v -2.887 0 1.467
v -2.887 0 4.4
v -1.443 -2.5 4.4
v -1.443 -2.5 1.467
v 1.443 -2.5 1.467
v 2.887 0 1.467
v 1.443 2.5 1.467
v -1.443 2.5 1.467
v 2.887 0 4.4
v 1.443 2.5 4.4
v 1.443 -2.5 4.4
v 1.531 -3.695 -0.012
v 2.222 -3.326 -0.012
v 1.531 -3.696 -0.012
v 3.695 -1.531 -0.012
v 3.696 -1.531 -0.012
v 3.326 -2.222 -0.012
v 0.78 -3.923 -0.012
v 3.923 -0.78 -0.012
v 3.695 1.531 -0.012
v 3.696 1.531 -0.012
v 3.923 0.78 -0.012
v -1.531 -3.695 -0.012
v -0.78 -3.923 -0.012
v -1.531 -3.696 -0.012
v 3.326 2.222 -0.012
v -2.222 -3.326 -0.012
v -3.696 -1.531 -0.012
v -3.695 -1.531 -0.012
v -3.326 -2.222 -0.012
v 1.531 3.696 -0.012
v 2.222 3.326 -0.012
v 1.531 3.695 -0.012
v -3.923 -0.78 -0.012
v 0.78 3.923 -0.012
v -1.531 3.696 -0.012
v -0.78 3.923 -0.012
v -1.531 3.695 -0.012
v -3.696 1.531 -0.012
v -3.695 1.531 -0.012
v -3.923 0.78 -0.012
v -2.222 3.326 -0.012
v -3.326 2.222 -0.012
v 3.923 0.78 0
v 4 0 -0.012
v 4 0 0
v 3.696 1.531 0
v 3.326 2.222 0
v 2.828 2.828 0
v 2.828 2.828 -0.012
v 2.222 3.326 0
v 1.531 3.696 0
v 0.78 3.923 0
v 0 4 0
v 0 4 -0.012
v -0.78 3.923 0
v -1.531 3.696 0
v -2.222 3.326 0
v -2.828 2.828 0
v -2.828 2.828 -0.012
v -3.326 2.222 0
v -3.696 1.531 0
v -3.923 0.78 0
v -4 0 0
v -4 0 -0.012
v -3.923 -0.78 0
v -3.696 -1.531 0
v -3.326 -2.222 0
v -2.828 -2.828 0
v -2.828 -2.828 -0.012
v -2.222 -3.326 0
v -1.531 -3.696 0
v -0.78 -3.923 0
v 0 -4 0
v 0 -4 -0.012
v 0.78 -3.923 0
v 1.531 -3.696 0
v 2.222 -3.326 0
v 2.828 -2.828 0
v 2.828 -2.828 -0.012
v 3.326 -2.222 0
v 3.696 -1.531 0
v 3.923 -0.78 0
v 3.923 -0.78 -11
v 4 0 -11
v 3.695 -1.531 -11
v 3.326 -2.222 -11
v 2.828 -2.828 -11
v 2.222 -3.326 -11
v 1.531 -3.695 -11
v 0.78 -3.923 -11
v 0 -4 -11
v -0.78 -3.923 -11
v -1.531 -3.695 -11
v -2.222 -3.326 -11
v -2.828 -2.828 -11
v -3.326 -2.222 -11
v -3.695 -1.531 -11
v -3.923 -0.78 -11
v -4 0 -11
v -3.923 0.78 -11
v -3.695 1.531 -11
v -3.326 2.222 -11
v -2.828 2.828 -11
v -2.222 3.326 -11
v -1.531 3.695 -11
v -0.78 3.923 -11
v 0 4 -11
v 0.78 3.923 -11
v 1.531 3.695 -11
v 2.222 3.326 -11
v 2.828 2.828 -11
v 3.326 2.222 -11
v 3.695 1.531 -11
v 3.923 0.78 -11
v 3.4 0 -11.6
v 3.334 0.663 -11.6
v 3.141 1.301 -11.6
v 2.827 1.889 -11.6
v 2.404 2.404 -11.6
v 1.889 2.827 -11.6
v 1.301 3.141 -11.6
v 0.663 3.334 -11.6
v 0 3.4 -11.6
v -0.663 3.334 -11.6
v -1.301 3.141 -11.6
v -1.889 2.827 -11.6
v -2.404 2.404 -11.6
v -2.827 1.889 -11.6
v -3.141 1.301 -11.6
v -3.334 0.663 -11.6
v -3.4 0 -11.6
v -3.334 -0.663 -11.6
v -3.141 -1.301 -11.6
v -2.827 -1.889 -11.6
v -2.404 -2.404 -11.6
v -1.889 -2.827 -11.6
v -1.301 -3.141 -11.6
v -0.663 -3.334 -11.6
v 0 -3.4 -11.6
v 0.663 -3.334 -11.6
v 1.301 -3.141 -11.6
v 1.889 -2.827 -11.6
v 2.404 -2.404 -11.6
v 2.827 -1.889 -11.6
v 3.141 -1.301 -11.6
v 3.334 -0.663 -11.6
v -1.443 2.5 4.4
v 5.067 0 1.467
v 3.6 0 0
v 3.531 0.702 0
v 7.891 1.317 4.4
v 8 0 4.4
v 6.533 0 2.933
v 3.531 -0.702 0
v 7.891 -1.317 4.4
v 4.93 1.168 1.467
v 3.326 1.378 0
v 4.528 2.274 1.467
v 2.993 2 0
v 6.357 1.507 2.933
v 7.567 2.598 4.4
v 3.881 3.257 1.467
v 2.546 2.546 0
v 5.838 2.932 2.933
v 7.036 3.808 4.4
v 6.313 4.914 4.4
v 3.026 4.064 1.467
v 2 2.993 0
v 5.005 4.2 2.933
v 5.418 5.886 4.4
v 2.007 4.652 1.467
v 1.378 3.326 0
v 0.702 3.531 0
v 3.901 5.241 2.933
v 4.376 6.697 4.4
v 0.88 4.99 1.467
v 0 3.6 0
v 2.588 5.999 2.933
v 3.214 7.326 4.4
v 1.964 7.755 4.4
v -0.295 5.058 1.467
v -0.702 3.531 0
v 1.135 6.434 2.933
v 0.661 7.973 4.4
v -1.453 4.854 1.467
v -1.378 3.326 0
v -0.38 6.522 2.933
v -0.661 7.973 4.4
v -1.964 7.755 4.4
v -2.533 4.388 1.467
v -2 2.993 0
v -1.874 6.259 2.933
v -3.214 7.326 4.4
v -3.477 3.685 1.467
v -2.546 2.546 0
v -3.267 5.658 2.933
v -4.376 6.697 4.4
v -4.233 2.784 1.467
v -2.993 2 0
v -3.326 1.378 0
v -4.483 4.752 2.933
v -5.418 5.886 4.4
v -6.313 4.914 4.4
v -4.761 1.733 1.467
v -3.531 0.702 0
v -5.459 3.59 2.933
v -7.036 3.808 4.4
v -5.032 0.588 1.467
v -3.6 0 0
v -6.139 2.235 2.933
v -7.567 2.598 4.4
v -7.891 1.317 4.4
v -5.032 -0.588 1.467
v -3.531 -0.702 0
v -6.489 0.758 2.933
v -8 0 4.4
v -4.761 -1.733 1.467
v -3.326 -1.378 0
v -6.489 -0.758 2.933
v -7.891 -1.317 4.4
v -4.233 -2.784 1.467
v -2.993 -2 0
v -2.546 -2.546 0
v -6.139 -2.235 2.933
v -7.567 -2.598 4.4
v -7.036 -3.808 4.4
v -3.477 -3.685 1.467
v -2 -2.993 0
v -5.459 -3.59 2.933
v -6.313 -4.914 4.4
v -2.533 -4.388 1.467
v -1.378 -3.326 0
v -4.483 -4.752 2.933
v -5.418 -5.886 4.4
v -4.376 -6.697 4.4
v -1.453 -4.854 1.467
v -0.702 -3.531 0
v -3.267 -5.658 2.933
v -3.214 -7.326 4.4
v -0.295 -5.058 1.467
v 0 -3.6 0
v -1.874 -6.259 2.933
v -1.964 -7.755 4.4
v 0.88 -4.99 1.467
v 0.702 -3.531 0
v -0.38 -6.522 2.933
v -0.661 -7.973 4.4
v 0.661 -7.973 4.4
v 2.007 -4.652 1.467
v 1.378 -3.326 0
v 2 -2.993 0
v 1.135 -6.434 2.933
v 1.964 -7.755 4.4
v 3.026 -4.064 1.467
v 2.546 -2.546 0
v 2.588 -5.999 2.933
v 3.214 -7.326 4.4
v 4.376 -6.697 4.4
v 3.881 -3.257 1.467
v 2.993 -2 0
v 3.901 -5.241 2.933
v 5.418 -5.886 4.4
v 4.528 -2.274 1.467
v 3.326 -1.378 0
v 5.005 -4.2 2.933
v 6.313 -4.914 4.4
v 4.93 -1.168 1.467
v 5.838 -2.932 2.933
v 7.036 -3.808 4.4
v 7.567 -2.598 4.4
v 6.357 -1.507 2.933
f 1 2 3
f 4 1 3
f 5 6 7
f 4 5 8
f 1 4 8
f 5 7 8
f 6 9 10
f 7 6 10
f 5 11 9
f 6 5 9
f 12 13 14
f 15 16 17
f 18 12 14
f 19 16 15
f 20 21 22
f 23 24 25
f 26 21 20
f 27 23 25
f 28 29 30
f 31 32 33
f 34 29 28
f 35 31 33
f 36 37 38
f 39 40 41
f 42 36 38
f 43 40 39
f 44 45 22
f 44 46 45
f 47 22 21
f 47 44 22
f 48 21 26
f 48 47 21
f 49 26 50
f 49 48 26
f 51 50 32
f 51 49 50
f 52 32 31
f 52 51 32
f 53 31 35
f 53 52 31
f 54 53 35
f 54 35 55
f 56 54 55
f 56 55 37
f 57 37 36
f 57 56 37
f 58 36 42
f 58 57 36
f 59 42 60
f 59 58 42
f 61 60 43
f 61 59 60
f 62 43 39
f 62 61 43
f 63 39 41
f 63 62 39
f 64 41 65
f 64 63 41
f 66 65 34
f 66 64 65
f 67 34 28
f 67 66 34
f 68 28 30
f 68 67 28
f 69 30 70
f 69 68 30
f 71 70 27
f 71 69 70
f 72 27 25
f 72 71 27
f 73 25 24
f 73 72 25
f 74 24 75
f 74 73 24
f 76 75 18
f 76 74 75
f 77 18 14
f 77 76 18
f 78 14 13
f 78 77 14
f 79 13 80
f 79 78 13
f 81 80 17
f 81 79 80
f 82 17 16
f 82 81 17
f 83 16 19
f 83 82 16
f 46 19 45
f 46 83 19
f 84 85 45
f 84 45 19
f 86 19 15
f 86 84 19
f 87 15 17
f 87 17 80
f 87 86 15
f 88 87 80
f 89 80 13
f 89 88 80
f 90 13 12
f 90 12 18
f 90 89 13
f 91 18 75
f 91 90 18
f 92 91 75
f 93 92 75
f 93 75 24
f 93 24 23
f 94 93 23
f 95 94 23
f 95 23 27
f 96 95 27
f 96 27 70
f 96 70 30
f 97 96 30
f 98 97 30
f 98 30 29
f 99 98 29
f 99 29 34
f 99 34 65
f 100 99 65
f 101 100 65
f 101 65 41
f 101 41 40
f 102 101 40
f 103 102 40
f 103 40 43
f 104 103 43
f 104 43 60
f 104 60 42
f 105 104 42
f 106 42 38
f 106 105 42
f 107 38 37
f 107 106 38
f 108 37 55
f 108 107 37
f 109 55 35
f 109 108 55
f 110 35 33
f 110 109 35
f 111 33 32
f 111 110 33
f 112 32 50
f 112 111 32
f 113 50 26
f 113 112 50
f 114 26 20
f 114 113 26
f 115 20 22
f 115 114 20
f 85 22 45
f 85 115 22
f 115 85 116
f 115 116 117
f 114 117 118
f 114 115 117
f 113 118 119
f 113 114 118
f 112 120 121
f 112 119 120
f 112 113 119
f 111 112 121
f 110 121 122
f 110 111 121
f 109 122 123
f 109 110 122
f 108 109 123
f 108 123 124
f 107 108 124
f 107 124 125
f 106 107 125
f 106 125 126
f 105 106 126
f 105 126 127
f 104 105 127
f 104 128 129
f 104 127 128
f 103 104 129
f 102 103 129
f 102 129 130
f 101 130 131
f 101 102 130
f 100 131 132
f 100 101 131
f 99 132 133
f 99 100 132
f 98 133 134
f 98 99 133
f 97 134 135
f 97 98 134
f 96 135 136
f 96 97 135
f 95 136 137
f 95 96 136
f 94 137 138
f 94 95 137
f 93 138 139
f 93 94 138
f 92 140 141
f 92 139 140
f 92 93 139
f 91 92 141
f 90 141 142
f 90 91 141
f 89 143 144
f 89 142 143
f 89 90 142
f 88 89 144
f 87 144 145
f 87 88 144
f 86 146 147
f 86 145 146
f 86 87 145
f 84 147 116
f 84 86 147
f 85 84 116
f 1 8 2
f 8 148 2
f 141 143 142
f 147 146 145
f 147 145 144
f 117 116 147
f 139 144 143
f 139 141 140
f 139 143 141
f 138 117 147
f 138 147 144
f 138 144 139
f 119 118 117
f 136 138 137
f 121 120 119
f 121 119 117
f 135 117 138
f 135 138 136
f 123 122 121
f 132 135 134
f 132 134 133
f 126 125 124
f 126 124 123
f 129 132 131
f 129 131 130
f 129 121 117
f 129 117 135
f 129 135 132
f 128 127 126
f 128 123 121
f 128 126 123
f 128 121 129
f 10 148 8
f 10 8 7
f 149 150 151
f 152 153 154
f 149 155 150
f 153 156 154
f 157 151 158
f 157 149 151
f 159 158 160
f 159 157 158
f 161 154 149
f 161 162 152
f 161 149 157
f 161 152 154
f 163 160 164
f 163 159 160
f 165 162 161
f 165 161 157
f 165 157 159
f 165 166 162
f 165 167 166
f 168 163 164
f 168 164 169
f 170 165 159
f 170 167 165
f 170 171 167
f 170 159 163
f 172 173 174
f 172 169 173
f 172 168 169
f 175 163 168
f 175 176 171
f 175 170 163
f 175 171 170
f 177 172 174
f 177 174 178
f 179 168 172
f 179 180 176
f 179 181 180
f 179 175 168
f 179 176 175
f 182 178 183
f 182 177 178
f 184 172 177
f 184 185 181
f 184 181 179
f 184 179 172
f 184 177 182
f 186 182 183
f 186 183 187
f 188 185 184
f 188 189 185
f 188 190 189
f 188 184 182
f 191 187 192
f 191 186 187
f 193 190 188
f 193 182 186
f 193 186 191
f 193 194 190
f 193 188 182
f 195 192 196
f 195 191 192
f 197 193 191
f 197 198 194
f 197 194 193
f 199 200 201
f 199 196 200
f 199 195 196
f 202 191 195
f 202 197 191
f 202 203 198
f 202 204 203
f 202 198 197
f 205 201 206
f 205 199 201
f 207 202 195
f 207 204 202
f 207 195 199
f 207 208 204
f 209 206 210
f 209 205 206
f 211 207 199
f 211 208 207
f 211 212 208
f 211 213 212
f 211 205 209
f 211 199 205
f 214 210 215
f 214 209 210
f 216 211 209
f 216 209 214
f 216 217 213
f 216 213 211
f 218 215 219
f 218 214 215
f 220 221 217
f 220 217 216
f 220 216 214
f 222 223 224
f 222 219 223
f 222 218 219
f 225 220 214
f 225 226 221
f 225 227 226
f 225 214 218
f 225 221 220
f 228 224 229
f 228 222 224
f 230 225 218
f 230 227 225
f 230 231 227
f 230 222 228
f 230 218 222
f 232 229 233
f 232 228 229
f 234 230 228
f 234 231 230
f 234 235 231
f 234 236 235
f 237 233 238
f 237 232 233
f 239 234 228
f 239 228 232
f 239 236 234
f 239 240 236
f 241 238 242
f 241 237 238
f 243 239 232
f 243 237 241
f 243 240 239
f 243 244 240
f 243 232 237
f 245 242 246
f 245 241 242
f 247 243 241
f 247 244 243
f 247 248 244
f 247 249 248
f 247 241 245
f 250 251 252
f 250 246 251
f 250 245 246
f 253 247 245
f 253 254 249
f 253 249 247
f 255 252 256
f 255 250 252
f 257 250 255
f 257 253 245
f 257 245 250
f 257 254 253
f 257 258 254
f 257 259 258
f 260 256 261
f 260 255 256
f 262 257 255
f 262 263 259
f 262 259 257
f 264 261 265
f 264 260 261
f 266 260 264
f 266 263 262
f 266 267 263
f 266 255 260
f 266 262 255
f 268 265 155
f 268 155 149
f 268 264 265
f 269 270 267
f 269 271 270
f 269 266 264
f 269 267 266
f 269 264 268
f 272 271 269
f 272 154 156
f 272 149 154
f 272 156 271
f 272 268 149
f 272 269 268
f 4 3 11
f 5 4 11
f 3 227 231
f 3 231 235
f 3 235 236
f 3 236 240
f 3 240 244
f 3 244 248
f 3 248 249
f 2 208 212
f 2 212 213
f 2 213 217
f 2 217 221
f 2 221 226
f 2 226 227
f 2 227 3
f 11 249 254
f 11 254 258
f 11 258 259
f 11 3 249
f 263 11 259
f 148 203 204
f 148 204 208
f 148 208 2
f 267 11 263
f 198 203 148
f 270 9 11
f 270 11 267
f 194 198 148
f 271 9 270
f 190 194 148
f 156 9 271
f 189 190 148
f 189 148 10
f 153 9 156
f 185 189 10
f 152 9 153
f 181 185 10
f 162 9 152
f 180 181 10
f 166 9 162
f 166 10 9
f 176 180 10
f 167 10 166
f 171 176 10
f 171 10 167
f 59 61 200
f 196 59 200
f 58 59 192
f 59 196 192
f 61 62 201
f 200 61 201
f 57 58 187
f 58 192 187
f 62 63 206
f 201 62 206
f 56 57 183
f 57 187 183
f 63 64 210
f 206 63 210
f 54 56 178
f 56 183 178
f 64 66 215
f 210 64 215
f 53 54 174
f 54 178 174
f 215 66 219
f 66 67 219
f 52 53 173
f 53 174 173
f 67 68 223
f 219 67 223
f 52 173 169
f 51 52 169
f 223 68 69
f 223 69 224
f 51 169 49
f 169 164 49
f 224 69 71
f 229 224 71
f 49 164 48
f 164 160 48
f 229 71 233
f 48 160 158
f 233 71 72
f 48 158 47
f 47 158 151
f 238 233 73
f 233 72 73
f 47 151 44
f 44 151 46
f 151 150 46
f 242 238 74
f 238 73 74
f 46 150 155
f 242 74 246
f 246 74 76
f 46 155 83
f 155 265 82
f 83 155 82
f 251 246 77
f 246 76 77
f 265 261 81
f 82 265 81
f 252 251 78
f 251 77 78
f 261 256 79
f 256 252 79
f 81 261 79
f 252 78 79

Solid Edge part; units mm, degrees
sketch "Sketch1" plane through (0, 0, 0) normal (0, 0, 1) x (1, 0, 0)
  circle A0 centre (0, 0) radius 8
  dimension "D1" = 16
extrude "Protrusion1" add sketch "Sketch1" along normal blind 4.4
sketch "Sketch2" plane through (0, 0, 0) normal (0, 0, -1) x (1, 0, 0)
  circle A0 centre (0, 0) radius 4
extrude "Protrusion2" add sketch "Sketch2" along normal blind 11.6
sketch "Sketch3" plane through (0, 0, -11.6) normal (0, 0, -1) x (1, 0, 0)
  circle A0 centre (0, 0) radius 3.9997
extrude "Cutout1" cut sketch "Sketch3" against normal blind 11.5884 flip side to cut
chamfer "Chamfer_1" distance 0.6 angle 45 1 edges at (-3.9997, 0, -11.6)
sketch "Sketch4" plane through (0, 0, 4.4) normal (0, 0, 1) x (1, 0, 0)
  line L0 (-1.4434, 2.5) -> (1.4434, 2.5)
  line L1 (2.8868, 0) -> (1.4434, 2.5)
  line L2 (1.4434, -2.5) -> (2.8868, 0)
  line L3 (-1.4434, -2.5) -> (1.4434, -2.5)
  line L4 (-2.8868, 0) -> (-1.4434, -2.5)
  line L5 (-1.4434, 2.5) -> (-2.8868, 0)
  dimension "D1" = 5
extrude "Cutout2" cut sketch "Sketch4" against normal blind 2.9333
sketch "Sketch5" plane through (0, 0, 0) normal (0, -1, 0) x (1, 0, 0)
  line L0 (8, 4.4) -> (3.6, 0)
  line L1 (3.6, 0) -> (8, 0)
  line L2 (8, 0) -> (8, 4.4)
revolve "RevolvedCutout1" cut sketch "Sketch5" angle 360 about axis through (0, 0, 14.0017) along (0, 0, -1)
properties part number "24101875"
